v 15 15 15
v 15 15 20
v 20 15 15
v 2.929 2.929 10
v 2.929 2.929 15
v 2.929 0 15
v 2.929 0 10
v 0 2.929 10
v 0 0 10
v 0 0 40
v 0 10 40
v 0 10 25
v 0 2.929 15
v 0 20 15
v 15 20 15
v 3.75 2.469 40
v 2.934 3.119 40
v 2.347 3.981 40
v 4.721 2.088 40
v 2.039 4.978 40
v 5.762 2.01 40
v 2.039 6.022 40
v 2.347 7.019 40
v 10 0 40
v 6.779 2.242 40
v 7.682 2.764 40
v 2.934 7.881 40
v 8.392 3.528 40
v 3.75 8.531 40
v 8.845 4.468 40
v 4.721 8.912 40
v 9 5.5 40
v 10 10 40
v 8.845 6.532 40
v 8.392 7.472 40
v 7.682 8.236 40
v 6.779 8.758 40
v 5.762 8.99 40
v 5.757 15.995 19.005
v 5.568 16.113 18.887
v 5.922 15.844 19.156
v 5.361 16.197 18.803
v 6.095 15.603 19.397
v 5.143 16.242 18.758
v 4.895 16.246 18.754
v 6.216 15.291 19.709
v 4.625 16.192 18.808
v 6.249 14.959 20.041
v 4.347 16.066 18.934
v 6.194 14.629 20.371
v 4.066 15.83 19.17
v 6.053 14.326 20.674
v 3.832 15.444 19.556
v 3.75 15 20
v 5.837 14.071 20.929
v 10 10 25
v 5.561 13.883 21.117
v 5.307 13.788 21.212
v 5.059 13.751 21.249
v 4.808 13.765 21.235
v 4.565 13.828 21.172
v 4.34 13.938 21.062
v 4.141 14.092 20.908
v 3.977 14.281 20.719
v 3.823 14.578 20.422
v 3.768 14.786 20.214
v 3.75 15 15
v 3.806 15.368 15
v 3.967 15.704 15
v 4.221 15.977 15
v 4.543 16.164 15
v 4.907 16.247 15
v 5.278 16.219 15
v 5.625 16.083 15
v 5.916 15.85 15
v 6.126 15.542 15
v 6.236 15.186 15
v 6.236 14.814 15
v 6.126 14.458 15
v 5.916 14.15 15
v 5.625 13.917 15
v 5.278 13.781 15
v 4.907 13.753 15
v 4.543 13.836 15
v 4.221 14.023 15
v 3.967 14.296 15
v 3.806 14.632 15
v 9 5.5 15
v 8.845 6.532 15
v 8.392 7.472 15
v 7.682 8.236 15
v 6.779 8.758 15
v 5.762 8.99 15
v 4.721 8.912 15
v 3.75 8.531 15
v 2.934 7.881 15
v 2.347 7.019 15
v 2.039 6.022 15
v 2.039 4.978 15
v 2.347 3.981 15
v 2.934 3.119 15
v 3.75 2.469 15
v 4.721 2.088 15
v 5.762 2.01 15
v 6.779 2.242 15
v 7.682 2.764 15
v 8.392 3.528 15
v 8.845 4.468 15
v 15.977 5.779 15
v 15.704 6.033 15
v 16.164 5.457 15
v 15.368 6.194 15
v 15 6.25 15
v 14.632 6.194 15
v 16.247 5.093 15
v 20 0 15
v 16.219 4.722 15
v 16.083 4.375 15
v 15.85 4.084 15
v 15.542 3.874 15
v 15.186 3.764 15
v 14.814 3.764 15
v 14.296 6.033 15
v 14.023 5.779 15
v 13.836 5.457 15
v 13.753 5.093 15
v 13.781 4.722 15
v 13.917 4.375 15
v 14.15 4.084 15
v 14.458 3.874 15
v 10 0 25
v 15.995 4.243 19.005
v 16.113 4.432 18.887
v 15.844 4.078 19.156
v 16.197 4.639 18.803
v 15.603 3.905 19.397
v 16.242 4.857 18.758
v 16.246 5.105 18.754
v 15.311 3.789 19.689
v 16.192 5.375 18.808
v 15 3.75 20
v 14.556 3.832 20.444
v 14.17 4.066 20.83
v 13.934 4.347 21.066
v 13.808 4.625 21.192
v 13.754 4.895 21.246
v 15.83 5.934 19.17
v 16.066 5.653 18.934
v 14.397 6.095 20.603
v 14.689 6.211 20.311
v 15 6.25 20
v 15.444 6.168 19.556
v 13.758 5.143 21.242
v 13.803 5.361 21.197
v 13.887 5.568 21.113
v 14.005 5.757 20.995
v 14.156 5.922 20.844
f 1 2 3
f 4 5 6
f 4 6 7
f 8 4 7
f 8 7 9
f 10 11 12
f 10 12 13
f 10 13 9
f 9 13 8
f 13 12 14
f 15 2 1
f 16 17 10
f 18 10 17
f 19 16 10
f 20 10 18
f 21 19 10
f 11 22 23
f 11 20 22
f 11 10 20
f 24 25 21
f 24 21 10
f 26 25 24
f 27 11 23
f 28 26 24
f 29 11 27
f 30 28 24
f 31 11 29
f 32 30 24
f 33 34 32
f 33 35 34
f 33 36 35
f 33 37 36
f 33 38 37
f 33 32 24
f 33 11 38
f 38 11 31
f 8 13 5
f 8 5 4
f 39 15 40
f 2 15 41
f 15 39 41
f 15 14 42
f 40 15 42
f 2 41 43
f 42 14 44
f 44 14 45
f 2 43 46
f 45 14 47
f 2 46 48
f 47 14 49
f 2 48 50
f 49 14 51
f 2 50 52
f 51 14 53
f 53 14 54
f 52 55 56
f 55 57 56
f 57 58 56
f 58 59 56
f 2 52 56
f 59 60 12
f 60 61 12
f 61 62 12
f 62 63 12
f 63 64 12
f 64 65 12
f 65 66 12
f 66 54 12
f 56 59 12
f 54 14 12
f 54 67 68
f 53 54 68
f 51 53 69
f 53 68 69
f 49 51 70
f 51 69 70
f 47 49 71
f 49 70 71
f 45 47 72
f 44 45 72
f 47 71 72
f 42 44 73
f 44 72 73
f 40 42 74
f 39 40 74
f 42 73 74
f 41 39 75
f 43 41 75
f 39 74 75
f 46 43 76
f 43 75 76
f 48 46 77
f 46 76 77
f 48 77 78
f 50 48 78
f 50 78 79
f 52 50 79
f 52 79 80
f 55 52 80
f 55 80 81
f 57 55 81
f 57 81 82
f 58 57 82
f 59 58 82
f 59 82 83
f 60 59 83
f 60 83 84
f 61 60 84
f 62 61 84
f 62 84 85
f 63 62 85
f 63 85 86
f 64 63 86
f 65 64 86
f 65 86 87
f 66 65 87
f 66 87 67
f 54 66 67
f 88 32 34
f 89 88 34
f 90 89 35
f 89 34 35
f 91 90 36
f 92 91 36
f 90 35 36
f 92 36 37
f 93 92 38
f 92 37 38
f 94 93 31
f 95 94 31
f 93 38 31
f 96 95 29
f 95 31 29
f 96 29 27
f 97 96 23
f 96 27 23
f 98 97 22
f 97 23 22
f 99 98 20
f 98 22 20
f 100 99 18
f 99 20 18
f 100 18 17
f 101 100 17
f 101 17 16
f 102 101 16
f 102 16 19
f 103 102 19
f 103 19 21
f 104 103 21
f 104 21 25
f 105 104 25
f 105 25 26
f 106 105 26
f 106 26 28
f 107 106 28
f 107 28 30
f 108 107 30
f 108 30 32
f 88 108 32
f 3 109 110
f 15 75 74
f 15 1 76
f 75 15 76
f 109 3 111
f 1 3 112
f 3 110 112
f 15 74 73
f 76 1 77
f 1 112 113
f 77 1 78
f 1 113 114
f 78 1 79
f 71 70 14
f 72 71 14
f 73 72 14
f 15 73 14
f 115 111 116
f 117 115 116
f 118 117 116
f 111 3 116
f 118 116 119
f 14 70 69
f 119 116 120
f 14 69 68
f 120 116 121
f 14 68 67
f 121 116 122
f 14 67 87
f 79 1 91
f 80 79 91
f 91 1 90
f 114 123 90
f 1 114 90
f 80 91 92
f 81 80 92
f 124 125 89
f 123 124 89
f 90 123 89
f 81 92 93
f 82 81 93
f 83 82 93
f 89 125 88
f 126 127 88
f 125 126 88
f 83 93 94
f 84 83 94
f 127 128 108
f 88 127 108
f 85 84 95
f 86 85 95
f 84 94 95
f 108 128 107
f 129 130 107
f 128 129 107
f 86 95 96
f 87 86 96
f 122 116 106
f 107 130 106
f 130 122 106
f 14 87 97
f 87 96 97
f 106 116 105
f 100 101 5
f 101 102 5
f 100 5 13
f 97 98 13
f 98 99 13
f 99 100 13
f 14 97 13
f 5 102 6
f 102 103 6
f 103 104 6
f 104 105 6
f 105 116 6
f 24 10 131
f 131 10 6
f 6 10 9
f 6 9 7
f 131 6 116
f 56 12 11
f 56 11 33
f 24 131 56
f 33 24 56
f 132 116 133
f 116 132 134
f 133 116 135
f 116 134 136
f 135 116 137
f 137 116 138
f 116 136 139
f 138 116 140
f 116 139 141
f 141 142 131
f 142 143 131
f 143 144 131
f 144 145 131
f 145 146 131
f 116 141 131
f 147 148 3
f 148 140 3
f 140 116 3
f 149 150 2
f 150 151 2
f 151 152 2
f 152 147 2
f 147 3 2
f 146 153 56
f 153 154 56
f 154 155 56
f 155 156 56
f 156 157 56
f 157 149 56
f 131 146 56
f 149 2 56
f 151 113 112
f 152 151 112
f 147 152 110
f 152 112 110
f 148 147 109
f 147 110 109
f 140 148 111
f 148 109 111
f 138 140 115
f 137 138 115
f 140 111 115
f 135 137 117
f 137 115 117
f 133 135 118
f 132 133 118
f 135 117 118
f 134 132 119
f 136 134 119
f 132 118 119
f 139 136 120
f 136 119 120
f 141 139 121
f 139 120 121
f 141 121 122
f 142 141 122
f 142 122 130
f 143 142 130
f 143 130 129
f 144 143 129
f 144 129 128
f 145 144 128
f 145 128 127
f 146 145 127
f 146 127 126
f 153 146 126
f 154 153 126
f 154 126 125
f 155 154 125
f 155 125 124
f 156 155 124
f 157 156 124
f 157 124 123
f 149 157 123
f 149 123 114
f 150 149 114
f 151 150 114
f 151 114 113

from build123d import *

# Parameters (mm, degrees)
SKETCH_1_W                = 20
SKETCH_1_H                = 20
EXTRUDE_1_DEPTH           = 40
SKETCH_2_W                = 10
SKETCH_2_H                = 15
CUT_EXTRUDE_1_DEPTH       = 7.071067812
PATTERN_CIRCULAR_1_COUNT  = 4
SKETCH_5_R                = 3.5
CUT_EXTRUDE_2_DEPTH       = 25
CUT_EXTRUDE_3_DEPTH       = 5
SKETCH_9_W                = 5.878932188
SKETCH_9_H                = 5.878932188
CUT_EXTRUDE_5_DEPTH       = 5
SKETCH_11_W               = 10
SKETCH_11_H               = 30
EXTRUDE_2_DEPTH           = 10
CUT_EXTRUDE_6_DEPTH       = 30
SKETCH_13_R               = 1.25
CUT_EXTRUDE_7_DEPTH       = 10
PATTERN_CIRCULAR_2_COUNT  = 4
SKETCH_16_W               = 20
SKETCH_16_H               = 10
CUT_EXTRUDE_11_DEPTH      = 40
SKETCH_17_W               = 20
SKETCH_17_H               = 20
SKETCH_17_W_2             = 5.857864376
SKETCH_17_H_2             = 5.857864376
CUT_EXTRUDE_12_DEPTH      = 5
CUT_EXTRUDE_13_DEPTH      = 54.851648071
CUT_EXTRUDE_13_DEPTH_BACK = 10
SKETCH_19_W               = 81.536041923
SKETCH_19_H               = 68.786769913
CUT_EXTRUDE_16_DEPTH      = 400
SKETCH_20_W               = 73.081310303
SKETCH_20_H               = 44.358386444
CUT_EXTRUDE_18_DEPTH      = 400


with BuildPart() as part:
    # 스케치1 → 보스-돌출1 (new body)
    with BuildSketch(Plane.XY):
        Rectangle(SKETCH_1_W, SKETCH_1_H)
    extrude(amount=EXTRUDE_1_DEPTH)

    # 스케치2 → 컷-돌출1 (cut)
    with BuildSketch(Plane(origin=(10, 0, 0), x_dir=(0, 0, -1), z_dir=(1, 0, 0))):
        with Locations((-10, 0)):
            Rectangle(SKETCH_2_W, SKETCH_2_H)
    cut_extrude_1 = extrude(amount=-CUT_EXTRUDE_1_DEPTH, mode=Mode.SUBTRACT)

    # 원형 패턴1: 컷-돌출1 ×4 about axis
    pattern_circular_1_axis = Axis((0, 0, 0), (0, 0, 1))
    for i in range(1, PATTERN_CIRCULAR_1_COUNT):
        add(cut_extrude_1.rotate(pattern_circular_1_axis, i * 360 / PATTERN_CIRCULAR_1_COUNT), mode=Mode.SUBTRACT)

    # 스케치5 → 컷-돌출2 (cut)
    with BuildSketch(Plane.XY.offset(40)):
        with Locations((-5.5, 5.5)):
            Circle(SKETCH_5_R)
        with Locations((5.5, 5.5)):
            Circle(SKETCH_5_R)
        with Locations(Location((-5.5, -5.5, 0), (0, 0, 235.150095421))):
            Circle(SKETCH_5_R)
        with Locations(Location((5.5, -5.5, 0), (0, 0, 304.849904579))):
            Circle(SKETCH_5_R)
    extrude(amount=-CUT_EXTRUDE_2_DEPTH, mode=Mode.SUBTRACT)

    # 스케치6 → 컷-돌출3 (cut)
    with BuildSketch(Plane(origin=(0, 0, 0), x_dir=(-1, 0, 0), z_dir=(0, 0, -1))):
        Polygon((-14.808802863, -2.95), (-14.808802863, 2.95), (-2.95, 2.95), (-2.95, 12.360254216), (2.95, 12.360254216), (2.95, 2.95), (13.852115441, 2.95), (13.852115441, -2.95), (2.95, -2.95), (2.95, -13.975695818), (-2.95, -13.975695818), (-2.95, -2.95), align=None)
    extrude(amount=-CUT_EXTRUDE_3_DEPTH, mode=Mode.SUBTRACT)

    # 스케치9 → 컷-돌출5 (cut)
    with BuildSketch(Plane(origin=(0, 0, 5), x_dir=(-1, 0, 0), z_dir=(0, 0, -1))):
        with Locations((0.010533906, -0.010533906)):
            Rectangle(SKETCH_9_W, SKETCH_9_H)
    extrude(amount=-CUT_EXTRUDE_5_DEPTH, mode=Mode.SUBTRACT)

    # 스케치11 → 보스-돌출2 (add)
    with BuildSketch(Plane(origin=(10, 0, 0), x_dir=(0, 0, -1), z_dir=(1, 0, 0))):
        with Locations((-20, 0)):
            Rectangle(SKETCH_11_W, SKETCH_11_H)
    extrude_2 = extrude(amount=EXTRUDE_2_DEPTH)

    # 스케치12 → 컷-돌출6 (cut)
    with BuildSketch(Plane(origin=(0, 15, 0), x_dir=(1, 0, 0), z_dir=(0, 1, 0))):
        Polygon((20, -15), (10, -25), (20, -25), align=None)
    cut_extrude_6 = extrude(amount=-CUT_EXTRUDE_6_DEPTH, mode=Mode.SUBTRACT)

    # 스케치13 → 컷-돌출7 (cut)
    with BuildSketch(Plane(origin=(0, 0, 15), x_dir=(-1, 0, 0), z_dir=(0, 0, -1))):
        with Locations(Location((-15, -5, 0), (0, 0, 90))):
            Circle(SKETCH_13_R)
        with Locations(Location((-15, 5, 0), (0, 0, 90))):
            Circle(SKETCH_13_R)
    cut_extrude_7 = extrude(amount=-CUT_EXTRUDE_7_DEPTH, mode=Mode.SUBTRACT)

    # 원형 패턴2: 보스-돌출2, 컷-돌출6, 컷-돌출7 ×4 about axis
    pattern_circular_2_axis = Axis((0, 0, 0), (0, 0, 1))
    add([extrude_2.rotate(pattern_circular_2_axis, i * 360 / PATTERN_CIRCULAR_2_COUNT) for i in range(1, PATTERN_CIRCULAR_2_COUNT)])
    add([cut_extrude_6.rotate(pattern_circular_2_axis, i * 360 / PATTERN_CIRCULAR_2_COUNT) for i in range(1, PATTERN_CIRCULAR_2_COUNT)], mode=Mode.SUBTRACT)
    add([cut_extrude_7.rotate(pattern_circular_2_axis, i * 360 / PATTERN_CIRCULAR_2_COUNT) for i in range(1, PATTERN_CIRCULAR_2_COUNT)], mode=Mode.SUBTRACT)

    # 스케치16 → 컷-돌출11 (cut)
    with BuildSketch(Plane.XZ.offset(10)):
        with Locations((0, 5)):
            Rectangle(SKETCH_16_W, SKETCH_16_H)
    extrude(amount=-CUT_EXTRUDE_11_DEPTH, mode=Mode.SUBTRACT)

    # 스케치17 → 컷-돌출12 (cut)
    with BuildSketch(Plane(origin=(0, 0, 10), x_dir=(-1, 0, 0), z_dir=(0, 0, -1))):
        Rectangle(SKETCH_17_W, SKETCH_17_H)
        Rectangle(SKETCH_17_W_2, SKETCH_17_H_2, mode=Mode.SUBTRACT)
    extrude(amount=-CUT_EXTRUDE_12_DEPTH, mode=Mode.SUBTRACT)

    # 스케치18 → 컷-돌출13 (cut, two sides: drawn at the far end of the back side and taken through both)
    with BuildSketch(Plane.XZ.offset(-10).offset(-CUT_EXTRUDE_13_DEPTH_BACK)):
        Polygon((10, 25), (15, 25), (15, 20), align=None)
    extrude(amount=CUT_EXTRUDE_13_DEPTH + CUT_EXTRUDE_13_DEPTH_BACK, mode=Mode.SUBTRACT)

    # 스케치19 → 컷-돌출16 (cut)
    with BuildSketch(Plane(origin=(0, 0, 0), x_dir=(1, 0, 0), z_dir=(0, 1, 0))):
        with Locations((9.636077682, -26.334226141)):
            Rectangle(SKETCH_19_W, SKETCH_19_H)
    extrude(amount=-CUT_EXTRUDE_16_DEPTH, mode=Mode.SUBTRACT)

    # 스케치20 → 컷-돌출18 (cut)
    with BuildSketch(Plane(origin=(0, 0, 0), x_dir=(0, 0, -1), z_dir=(1, 0, 0))):
        with Locations((-16.834813983, 6.467543638)):
            Rectangle(SKETCH_20_W, SKETCH_20_H)
    extrude(amount=-CUT_EXTRUDE_18_DEPTH, mode=Mode.SUBTRACT)


solid = part.part
